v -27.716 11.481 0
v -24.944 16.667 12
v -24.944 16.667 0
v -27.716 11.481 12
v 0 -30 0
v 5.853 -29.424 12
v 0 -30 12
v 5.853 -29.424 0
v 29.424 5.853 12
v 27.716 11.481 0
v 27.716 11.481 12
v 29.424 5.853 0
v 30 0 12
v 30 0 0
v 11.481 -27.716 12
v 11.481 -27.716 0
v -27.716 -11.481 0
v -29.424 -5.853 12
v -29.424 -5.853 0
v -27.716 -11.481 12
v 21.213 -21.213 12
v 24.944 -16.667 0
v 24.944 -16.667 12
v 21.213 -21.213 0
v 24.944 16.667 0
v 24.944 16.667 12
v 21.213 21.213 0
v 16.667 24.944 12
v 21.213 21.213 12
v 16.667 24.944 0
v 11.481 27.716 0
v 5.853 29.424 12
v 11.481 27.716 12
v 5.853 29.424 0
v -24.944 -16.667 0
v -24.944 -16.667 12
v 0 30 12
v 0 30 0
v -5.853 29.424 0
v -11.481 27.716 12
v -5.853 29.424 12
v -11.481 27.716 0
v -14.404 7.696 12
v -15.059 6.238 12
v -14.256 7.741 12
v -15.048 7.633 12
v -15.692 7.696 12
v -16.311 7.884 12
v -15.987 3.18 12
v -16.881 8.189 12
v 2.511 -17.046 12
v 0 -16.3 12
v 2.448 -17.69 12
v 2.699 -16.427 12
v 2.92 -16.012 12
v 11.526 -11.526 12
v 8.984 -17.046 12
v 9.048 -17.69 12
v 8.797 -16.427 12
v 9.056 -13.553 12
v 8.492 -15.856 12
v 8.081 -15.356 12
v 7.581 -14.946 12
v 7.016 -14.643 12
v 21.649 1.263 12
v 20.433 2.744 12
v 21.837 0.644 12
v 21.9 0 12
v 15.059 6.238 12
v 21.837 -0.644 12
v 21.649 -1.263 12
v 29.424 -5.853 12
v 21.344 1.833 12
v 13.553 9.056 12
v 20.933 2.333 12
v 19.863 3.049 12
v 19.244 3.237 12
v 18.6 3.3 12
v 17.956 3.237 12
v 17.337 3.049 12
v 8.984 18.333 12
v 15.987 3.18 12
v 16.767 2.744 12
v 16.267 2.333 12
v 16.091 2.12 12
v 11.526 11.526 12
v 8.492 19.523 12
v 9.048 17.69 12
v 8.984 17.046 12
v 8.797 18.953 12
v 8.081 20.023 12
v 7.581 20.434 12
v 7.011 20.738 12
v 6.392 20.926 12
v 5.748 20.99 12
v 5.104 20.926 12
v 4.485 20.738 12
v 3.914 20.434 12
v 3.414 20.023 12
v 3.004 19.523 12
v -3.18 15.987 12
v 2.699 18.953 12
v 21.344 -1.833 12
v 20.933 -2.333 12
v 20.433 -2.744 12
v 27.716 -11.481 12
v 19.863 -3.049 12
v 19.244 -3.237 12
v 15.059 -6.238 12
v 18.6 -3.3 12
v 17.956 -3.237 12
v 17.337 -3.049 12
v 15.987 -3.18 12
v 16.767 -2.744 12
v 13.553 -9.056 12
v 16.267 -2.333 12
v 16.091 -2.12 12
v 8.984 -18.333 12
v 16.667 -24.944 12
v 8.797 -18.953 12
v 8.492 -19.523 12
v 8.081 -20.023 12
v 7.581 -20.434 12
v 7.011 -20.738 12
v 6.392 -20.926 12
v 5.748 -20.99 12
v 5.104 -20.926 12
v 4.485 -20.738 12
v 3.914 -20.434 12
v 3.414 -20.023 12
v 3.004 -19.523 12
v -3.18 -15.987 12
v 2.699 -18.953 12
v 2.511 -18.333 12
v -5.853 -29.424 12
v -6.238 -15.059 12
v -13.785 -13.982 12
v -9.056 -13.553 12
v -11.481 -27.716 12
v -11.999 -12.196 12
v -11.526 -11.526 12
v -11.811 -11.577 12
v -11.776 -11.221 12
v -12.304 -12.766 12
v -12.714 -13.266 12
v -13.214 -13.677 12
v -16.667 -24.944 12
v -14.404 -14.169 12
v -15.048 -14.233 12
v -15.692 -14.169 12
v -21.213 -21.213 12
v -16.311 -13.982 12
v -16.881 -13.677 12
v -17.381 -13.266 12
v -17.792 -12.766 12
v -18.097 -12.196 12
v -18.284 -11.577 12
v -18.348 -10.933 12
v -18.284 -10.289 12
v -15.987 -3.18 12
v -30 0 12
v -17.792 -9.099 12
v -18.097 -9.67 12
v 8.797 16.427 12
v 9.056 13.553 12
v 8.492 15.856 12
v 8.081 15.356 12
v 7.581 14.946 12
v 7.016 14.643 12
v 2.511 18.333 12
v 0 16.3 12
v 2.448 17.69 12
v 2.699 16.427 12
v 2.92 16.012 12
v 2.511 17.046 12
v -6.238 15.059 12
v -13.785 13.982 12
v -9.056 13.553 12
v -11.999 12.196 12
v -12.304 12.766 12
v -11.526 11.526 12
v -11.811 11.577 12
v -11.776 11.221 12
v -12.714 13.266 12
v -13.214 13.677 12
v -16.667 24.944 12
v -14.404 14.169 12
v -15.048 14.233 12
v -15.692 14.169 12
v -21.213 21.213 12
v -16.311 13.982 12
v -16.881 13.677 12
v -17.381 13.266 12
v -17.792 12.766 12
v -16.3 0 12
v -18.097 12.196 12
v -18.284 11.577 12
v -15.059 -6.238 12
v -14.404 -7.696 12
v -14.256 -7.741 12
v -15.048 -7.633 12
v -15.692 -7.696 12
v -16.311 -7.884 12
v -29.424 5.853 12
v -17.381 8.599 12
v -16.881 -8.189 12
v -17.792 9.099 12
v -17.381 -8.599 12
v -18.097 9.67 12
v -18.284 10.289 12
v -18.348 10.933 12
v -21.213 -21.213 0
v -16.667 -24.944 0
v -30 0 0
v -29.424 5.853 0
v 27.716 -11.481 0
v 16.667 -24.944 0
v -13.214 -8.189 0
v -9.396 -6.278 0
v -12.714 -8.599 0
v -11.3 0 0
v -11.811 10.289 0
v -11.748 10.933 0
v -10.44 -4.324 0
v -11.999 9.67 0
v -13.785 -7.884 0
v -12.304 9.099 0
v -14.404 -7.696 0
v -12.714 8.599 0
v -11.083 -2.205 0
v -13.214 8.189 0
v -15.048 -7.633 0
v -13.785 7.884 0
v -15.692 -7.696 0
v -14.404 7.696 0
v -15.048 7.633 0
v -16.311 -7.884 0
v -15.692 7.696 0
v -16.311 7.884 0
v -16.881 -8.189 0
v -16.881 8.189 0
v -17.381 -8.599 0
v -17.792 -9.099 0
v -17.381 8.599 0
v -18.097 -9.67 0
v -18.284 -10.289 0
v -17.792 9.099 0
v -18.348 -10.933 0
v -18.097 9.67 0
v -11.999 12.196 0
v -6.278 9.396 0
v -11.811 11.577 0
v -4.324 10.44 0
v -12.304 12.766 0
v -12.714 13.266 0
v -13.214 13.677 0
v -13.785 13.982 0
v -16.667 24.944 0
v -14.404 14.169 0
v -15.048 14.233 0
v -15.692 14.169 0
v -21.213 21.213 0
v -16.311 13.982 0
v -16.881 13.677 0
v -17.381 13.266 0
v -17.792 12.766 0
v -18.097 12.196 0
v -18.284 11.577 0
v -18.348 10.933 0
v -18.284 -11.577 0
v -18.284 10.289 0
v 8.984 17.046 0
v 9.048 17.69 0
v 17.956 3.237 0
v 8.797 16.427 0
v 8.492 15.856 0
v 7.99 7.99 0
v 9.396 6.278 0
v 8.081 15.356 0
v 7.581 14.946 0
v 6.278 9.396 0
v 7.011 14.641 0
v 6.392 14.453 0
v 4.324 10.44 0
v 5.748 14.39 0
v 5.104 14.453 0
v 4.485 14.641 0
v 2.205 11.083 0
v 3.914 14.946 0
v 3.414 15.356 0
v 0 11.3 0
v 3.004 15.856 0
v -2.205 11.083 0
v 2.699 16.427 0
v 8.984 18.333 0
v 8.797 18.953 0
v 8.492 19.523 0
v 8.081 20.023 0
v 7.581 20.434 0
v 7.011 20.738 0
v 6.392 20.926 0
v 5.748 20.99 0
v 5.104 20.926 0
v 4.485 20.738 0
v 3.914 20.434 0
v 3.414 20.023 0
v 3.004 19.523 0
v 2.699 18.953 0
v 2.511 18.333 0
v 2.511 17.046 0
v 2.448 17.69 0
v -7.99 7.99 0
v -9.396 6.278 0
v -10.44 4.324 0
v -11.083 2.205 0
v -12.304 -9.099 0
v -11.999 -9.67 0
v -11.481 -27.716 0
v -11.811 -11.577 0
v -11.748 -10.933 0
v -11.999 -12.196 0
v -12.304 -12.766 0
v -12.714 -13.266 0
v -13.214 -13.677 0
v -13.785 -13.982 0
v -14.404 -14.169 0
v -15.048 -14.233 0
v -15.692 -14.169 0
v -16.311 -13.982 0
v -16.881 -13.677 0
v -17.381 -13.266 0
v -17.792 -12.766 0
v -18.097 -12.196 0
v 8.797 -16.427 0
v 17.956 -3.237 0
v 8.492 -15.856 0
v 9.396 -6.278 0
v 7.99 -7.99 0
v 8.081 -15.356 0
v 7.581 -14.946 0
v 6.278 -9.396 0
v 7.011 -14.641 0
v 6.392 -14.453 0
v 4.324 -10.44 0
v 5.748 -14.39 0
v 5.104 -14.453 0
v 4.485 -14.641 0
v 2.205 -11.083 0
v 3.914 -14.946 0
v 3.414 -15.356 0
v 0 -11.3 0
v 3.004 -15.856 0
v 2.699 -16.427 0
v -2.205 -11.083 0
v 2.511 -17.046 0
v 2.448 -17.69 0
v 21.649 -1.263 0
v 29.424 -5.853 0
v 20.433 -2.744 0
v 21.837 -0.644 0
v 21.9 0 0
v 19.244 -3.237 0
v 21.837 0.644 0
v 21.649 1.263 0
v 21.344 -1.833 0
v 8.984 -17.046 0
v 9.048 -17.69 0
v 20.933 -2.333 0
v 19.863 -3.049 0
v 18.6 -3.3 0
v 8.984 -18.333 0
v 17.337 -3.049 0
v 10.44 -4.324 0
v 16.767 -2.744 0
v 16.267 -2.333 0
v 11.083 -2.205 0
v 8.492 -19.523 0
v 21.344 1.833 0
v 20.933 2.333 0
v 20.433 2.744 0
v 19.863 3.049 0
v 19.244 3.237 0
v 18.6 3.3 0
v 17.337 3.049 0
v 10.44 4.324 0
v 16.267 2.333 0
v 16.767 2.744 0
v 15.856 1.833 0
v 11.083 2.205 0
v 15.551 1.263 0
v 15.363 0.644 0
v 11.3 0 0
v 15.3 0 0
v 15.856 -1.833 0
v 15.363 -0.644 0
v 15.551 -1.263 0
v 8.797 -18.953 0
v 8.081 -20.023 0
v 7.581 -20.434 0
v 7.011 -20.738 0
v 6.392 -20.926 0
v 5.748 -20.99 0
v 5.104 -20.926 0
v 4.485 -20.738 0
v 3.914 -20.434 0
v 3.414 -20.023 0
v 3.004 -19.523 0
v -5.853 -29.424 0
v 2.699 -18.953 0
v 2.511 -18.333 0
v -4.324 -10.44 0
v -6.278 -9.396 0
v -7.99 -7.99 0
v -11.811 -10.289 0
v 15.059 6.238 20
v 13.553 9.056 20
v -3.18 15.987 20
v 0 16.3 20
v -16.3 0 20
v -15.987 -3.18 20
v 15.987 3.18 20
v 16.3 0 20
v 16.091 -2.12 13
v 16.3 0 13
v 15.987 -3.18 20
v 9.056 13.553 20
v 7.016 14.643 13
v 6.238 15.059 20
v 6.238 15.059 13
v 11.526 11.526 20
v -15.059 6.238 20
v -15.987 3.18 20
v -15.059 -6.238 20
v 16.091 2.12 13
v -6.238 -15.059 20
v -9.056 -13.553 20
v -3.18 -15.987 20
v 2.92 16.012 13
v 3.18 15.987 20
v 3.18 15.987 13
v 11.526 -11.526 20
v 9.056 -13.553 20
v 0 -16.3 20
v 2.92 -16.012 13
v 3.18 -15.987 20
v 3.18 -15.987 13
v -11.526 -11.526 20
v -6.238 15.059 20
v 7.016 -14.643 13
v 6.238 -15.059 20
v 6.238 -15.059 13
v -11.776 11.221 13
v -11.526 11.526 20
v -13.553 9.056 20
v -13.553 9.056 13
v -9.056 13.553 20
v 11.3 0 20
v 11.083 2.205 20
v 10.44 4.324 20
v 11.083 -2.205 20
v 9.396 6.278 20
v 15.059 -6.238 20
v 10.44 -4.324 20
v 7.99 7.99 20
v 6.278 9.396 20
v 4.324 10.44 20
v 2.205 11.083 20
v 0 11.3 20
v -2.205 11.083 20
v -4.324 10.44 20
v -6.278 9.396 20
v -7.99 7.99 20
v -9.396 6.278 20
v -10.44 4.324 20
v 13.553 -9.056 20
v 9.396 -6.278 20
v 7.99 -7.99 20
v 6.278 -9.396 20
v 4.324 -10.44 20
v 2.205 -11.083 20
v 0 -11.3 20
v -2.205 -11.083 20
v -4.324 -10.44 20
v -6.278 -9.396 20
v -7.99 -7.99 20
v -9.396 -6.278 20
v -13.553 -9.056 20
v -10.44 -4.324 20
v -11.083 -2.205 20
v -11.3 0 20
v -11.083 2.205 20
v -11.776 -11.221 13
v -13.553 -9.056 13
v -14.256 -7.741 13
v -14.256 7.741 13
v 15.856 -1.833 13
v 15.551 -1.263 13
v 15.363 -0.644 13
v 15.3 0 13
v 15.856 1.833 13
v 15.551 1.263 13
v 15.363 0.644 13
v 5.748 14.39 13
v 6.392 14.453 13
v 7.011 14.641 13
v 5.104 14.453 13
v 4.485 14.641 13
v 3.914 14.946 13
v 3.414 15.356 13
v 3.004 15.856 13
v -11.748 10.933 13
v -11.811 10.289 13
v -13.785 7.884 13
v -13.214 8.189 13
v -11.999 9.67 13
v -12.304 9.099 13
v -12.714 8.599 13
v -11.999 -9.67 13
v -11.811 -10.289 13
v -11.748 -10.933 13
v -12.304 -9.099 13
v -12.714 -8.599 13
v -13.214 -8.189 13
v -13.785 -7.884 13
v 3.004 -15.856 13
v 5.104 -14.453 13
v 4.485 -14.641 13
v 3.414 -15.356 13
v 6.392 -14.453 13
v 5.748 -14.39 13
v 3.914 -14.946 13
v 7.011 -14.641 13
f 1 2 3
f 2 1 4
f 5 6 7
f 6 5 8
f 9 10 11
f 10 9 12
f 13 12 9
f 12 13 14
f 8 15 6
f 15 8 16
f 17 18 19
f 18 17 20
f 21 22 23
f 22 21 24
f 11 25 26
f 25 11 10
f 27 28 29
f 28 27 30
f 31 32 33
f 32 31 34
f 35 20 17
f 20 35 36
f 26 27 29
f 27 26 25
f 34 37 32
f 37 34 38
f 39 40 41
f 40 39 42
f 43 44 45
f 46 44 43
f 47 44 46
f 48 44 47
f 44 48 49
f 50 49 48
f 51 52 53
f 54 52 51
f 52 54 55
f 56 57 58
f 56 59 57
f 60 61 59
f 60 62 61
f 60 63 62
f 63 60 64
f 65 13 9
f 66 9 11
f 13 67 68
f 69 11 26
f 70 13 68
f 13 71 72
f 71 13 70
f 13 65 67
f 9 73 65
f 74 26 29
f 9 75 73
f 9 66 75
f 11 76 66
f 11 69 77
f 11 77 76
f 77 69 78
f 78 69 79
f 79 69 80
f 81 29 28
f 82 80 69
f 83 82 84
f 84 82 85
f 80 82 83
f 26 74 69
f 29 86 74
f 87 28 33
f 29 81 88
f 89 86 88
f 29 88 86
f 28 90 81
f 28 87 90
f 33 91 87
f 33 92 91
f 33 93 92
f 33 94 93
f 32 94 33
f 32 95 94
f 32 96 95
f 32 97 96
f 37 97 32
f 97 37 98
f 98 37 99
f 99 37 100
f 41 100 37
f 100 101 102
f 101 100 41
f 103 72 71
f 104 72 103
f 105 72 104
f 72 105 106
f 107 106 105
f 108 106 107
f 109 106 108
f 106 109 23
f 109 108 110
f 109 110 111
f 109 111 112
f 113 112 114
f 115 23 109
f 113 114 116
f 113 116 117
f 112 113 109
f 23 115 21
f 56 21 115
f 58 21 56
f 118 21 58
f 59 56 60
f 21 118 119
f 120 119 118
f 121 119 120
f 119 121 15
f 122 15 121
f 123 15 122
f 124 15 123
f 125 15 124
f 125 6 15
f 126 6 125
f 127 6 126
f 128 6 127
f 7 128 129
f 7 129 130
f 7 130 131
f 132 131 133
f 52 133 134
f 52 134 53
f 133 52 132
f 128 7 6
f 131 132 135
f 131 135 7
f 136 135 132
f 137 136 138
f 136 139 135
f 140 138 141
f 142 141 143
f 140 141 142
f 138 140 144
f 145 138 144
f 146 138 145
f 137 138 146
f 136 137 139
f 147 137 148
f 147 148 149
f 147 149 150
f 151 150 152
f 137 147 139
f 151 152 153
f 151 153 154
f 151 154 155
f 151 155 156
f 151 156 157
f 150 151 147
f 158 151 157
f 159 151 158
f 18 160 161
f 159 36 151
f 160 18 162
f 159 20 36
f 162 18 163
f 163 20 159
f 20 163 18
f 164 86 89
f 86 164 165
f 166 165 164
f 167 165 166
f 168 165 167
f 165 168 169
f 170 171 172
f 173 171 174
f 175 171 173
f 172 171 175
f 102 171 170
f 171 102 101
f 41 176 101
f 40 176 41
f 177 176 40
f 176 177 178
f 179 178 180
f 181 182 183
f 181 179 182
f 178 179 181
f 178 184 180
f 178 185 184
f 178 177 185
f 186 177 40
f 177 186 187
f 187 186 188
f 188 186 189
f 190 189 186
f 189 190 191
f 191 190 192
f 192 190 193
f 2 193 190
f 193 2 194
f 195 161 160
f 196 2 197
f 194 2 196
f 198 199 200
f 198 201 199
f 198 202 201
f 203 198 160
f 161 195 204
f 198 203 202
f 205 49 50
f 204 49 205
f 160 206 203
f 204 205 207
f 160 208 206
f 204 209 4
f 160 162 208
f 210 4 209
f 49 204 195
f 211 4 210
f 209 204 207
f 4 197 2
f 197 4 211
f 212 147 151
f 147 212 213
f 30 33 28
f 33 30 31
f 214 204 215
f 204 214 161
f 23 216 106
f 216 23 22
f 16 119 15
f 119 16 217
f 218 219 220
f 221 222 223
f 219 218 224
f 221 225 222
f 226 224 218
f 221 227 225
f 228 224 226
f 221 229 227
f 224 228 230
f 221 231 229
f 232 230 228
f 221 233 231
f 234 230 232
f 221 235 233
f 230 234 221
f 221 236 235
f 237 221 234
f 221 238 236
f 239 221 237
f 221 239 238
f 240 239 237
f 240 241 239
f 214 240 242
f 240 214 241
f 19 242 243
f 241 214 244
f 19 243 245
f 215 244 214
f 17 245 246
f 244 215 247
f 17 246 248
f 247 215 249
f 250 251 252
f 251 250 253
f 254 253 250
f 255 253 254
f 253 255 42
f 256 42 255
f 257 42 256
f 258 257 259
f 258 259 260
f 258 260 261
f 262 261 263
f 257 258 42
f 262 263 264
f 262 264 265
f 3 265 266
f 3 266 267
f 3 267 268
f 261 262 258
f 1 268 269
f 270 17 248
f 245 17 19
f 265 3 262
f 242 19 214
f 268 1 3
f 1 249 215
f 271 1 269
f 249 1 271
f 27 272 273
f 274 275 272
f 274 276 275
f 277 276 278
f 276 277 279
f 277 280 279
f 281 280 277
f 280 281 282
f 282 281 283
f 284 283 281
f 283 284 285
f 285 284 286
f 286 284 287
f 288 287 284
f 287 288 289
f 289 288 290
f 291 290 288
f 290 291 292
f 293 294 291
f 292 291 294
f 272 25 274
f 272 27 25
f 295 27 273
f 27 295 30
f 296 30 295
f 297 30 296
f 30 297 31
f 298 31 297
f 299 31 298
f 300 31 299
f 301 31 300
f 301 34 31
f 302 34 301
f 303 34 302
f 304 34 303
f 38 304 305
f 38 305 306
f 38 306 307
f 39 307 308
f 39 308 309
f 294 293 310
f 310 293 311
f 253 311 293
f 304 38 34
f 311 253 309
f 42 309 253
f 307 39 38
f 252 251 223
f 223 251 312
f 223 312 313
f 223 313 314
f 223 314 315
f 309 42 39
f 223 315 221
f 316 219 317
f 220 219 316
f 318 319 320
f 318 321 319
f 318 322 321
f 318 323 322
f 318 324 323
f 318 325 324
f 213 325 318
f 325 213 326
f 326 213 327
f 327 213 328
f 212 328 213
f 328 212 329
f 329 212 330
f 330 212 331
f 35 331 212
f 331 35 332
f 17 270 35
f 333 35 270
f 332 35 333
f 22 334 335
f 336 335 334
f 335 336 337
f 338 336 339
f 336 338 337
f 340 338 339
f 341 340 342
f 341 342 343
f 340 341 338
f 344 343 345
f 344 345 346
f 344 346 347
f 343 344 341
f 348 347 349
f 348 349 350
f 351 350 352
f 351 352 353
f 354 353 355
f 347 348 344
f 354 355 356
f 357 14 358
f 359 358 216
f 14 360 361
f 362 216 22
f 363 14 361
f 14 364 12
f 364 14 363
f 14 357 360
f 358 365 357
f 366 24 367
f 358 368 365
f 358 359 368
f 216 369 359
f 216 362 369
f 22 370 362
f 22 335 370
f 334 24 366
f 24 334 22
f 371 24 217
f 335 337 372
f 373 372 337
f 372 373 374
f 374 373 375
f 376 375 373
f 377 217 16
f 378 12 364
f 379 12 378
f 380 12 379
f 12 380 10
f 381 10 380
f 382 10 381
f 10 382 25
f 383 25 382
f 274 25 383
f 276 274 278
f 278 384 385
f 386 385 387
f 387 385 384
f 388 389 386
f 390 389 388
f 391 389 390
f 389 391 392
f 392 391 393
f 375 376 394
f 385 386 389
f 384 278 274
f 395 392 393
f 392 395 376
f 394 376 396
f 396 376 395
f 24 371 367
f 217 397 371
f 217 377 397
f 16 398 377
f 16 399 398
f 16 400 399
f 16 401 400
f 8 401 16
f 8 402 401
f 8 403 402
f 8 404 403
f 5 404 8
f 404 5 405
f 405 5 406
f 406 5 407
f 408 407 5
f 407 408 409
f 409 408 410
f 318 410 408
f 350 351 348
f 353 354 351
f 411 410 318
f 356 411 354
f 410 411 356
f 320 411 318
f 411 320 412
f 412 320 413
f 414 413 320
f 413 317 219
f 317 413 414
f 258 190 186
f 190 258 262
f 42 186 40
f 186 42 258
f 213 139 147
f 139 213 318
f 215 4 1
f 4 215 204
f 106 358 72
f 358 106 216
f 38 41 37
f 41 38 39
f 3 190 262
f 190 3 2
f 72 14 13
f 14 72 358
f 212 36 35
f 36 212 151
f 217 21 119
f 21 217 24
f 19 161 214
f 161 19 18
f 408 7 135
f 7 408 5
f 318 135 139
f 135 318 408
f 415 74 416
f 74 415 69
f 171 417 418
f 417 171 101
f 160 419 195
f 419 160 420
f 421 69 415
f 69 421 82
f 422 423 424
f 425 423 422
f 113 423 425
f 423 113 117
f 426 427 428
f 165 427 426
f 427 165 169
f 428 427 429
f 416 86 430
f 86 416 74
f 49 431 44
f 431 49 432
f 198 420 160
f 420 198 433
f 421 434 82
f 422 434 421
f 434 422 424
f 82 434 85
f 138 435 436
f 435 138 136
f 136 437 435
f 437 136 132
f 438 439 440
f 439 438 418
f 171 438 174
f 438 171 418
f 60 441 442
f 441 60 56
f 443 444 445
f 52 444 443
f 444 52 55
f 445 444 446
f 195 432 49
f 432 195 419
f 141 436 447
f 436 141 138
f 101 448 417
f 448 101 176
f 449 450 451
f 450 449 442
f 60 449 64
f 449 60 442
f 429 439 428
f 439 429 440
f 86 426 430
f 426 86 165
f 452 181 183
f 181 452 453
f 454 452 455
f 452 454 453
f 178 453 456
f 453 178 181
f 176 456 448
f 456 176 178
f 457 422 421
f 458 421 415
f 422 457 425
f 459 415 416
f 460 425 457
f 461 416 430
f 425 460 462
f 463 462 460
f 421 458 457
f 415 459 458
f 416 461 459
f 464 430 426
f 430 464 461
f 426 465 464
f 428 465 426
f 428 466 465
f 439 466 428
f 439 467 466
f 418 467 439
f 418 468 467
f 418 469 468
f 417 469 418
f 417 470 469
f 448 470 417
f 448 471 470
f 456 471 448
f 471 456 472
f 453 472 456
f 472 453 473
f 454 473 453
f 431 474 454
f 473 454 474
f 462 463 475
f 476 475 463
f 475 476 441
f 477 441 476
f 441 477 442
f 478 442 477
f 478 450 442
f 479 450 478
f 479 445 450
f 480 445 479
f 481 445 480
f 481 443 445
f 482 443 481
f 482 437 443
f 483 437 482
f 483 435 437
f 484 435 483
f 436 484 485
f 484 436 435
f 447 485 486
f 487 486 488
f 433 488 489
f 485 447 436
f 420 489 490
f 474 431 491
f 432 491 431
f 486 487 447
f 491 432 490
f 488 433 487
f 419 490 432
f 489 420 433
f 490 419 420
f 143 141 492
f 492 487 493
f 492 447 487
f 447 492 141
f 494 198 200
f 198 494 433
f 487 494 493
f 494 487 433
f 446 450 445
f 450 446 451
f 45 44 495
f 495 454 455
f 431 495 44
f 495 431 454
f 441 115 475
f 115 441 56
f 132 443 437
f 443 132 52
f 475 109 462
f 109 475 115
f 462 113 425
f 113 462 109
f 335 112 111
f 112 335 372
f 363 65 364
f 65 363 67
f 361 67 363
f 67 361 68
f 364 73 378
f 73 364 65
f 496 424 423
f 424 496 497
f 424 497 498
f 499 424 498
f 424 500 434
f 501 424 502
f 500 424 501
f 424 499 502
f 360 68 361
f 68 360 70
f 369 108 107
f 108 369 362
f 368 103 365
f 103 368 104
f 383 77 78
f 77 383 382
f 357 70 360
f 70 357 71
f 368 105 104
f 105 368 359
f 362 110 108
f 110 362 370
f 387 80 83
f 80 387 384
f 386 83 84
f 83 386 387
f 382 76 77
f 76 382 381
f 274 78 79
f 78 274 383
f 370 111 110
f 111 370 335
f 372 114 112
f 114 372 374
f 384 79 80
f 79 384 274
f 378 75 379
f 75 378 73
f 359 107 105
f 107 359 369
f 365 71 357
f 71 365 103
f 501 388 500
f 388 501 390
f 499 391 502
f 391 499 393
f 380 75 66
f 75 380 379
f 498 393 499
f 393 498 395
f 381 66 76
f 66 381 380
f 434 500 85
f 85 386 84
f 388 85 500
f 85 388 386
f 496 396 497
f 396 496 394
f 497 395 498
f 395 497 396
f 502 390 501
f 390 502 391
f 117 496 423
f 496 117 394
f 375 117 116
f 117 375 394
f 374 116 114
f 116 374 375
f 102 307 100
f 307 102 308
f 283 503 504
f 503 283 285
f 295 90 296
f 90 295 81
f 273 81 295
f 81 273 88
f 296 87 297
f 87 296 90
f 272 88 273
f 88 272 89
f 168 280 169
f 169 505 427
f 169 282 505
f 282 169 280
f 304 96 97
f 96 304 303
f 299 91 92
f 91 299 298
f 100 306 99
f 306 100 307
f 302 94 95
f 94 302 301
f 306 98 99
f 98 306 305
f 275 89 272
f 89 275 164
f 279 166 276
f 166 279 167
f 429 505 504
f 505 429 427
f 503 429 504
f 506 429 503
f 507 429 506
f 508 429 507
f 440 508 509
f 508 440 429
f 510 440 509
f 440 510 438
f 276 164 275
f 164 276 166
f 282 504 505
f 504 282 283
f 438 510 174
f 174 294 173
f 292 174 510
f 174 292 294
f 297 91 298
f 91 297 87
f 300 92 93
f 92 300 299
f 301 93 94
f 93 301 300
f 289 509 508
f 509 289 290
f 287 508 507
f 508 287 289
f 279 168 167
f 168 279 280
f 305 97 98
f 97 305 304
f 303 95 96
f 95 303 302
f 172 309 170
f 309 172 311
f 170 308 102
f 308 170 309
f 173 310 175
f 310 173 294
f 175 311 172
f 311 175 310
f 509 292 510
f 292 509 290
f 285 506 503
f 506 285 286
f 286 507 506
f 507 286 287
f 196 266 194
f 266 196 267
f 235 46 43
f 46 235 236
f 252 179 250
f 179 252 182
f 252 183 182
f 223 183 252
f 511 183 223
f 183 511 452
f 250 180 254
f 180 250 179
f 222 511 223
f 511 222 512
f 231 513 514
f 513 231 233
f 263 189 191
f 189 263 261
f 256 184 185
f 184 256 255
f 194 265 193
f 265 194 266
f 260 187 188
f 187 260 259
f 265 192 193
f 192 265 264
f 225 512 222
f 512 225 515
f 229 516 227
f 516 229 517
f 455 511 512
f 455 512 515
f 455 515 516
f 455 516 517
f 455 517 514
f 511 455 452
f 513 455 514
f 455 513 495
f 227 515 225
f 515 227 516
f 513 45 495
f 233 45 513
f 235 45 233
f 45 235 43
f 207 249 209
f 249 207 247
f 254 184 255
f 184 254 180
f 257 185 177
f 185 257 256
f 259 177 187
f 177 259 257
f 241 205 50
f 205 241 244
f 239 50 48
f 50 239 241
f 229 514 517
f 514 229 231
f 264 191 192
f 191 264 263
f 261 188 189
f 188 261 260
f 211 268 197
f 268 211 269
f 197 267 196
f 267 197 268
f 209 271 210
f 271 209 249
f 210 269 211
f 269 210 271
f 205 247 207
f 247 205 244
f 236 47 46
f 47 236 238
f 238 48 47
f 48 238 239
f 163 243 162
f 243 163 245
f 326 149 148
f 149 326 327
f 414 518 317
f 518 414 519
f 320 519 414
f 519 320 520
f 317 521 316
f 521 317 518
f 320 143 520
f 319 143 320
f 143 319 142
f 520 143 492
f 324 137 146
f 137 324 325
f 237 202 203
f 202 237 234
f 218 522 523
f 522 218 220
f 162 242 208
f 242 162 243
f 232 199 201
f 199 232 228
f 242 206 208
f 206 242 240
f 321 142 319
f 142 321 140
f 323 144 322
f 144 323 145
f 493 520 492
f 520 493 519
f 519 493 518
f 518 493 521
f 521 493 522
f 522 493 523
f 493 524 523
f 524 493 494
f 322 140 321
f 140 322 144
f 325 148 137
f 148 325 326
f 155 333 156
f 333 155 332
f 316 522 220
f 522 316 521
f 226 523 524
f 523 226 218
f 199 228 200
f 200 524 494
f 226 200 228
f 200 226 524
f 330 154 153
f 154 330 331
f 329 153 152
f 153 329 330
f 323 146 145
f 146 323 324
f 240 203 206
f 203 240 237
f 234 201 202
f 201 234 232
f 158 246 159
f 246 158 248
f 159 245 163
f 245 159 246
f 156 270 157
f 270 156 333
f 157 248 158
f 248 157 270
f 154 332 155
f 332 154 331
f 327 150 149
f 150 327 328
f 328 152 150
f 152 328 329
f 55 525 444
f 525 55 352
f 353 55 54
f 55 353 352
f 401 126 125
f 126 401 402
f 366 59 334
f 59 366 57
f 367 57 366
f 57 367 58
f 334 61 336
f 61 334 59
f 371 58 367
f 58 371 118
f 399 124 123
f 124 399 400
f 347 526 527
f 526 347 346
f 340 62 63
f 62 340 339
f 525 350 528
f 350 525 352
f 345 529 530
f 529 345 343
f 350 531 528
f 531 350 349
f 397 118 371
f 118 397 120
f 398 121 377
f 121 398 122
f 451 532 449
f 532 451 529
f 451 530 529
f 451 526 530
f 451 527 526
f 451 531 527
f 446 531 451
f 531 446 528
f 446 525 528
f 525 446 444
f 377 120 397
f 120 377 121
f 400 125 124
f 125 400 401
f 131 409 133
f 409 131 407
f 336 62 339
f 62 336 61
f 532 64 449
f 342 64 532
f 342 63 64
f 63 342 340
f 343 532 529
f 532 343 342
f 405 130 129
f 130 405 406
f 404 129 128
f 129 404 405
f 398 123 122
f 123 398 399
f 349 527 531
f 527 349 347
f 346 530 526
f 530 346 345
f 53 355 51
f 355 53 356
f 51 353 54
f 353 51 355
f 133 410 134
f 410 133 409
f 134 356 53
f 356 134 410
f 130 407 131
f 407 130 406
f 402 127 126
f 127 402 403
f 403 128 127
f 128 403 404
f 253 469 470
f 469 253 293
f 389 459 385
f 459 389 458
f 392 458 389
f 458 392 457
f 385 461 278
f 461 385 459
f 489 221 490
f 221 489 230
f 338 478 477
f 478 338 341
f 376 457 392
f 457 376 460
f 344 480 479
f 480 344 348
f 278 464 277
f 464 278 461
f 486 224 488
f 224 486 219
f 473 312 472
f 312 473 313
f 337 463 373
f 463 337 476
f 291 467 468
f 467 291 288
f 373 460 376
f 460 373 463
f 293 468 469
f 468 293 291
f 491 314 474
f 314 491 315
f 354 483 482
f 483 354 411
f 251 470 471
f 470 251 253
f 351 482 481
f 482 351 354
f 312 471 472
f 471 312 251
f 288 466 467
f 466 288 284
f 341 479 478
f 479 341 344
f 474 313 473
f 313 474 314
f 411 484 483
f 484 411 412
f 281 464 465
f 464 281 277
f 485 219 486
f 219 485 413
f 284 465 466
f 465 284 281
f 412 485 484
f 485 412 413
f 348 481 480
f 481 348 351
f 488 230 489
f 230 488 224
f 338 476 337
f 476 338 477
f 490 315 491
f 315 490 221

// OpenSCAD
$fn = 32;

// ----------------------------------------------------------------------
// Flange Ø60 x 12
// 5 holes on a Ø37.2 bolt circle, bolted joints
// ----------------------------------------------------------------------

// --- parameters (mm) ---
flange_d = 60;   // outside diameter of the flange
thickness = 12;  // flange thickness
holes = 5;       // number of bolt holes
pcd = 37.2;      // bolt circle diameter
start_deg = 0;   // angle of the first hole, from +X
hole_d = 6.6;    // bolt hole diameter
bore_d = 22.6;   // central through bore
hub_d = 32.6;    // hub outside diameter
hub_h = 8;       // hub height above the flange face (0 = no hub)

// --- derived feature positions (mm) ---
height = thickness + hub_h;  // = 20   overall height of the part
pcd_r = pcd / 2;             // = 18.6   bolt circle radius
hole_step = 360 / holes;     // = 72   angular pitch
feature_centers = [
  [pcd_r * cos(start_deg + 0 * hole_step), pcd_r * sin(start_deg + 0 * hole_step)],
  [pcd_r * cos(start_deg + 1 * hole_step), pcd_r * sin(start_deg + 1 * hole_step)],
  [pcd_r * cos(start_deg + 2 * hole_step), pcd_r * sin(start_deg + 2 * hole_step)],
  [pcd_r * cos(start_deg + 3 * hole_step), pcd_r * sin(start_deg + 3 * hole_step)],
  [pcd_r * cos(start_deg + 4 * hole_step), pcd_r * sin(start_deg + 4 * hole_step)]
];   // bolt hole centres on the pitch circle

// flange disc, every hole and the bore cut straight through
difference() {
  union() {
    cylinder(d = flange_d, h = thickness);
    cylinder(d = hub_d, h = height);  // hub, overlapped into the flange
  }
  translate([0, 0, -1]) cylinder(d = bore_d, h = height + 2);  // bore, through
  for (centre = feature_centers)
    translate([centre[0], centre[1], -1]) cylinder(d = hole_d, h = thickness + 2);
}
